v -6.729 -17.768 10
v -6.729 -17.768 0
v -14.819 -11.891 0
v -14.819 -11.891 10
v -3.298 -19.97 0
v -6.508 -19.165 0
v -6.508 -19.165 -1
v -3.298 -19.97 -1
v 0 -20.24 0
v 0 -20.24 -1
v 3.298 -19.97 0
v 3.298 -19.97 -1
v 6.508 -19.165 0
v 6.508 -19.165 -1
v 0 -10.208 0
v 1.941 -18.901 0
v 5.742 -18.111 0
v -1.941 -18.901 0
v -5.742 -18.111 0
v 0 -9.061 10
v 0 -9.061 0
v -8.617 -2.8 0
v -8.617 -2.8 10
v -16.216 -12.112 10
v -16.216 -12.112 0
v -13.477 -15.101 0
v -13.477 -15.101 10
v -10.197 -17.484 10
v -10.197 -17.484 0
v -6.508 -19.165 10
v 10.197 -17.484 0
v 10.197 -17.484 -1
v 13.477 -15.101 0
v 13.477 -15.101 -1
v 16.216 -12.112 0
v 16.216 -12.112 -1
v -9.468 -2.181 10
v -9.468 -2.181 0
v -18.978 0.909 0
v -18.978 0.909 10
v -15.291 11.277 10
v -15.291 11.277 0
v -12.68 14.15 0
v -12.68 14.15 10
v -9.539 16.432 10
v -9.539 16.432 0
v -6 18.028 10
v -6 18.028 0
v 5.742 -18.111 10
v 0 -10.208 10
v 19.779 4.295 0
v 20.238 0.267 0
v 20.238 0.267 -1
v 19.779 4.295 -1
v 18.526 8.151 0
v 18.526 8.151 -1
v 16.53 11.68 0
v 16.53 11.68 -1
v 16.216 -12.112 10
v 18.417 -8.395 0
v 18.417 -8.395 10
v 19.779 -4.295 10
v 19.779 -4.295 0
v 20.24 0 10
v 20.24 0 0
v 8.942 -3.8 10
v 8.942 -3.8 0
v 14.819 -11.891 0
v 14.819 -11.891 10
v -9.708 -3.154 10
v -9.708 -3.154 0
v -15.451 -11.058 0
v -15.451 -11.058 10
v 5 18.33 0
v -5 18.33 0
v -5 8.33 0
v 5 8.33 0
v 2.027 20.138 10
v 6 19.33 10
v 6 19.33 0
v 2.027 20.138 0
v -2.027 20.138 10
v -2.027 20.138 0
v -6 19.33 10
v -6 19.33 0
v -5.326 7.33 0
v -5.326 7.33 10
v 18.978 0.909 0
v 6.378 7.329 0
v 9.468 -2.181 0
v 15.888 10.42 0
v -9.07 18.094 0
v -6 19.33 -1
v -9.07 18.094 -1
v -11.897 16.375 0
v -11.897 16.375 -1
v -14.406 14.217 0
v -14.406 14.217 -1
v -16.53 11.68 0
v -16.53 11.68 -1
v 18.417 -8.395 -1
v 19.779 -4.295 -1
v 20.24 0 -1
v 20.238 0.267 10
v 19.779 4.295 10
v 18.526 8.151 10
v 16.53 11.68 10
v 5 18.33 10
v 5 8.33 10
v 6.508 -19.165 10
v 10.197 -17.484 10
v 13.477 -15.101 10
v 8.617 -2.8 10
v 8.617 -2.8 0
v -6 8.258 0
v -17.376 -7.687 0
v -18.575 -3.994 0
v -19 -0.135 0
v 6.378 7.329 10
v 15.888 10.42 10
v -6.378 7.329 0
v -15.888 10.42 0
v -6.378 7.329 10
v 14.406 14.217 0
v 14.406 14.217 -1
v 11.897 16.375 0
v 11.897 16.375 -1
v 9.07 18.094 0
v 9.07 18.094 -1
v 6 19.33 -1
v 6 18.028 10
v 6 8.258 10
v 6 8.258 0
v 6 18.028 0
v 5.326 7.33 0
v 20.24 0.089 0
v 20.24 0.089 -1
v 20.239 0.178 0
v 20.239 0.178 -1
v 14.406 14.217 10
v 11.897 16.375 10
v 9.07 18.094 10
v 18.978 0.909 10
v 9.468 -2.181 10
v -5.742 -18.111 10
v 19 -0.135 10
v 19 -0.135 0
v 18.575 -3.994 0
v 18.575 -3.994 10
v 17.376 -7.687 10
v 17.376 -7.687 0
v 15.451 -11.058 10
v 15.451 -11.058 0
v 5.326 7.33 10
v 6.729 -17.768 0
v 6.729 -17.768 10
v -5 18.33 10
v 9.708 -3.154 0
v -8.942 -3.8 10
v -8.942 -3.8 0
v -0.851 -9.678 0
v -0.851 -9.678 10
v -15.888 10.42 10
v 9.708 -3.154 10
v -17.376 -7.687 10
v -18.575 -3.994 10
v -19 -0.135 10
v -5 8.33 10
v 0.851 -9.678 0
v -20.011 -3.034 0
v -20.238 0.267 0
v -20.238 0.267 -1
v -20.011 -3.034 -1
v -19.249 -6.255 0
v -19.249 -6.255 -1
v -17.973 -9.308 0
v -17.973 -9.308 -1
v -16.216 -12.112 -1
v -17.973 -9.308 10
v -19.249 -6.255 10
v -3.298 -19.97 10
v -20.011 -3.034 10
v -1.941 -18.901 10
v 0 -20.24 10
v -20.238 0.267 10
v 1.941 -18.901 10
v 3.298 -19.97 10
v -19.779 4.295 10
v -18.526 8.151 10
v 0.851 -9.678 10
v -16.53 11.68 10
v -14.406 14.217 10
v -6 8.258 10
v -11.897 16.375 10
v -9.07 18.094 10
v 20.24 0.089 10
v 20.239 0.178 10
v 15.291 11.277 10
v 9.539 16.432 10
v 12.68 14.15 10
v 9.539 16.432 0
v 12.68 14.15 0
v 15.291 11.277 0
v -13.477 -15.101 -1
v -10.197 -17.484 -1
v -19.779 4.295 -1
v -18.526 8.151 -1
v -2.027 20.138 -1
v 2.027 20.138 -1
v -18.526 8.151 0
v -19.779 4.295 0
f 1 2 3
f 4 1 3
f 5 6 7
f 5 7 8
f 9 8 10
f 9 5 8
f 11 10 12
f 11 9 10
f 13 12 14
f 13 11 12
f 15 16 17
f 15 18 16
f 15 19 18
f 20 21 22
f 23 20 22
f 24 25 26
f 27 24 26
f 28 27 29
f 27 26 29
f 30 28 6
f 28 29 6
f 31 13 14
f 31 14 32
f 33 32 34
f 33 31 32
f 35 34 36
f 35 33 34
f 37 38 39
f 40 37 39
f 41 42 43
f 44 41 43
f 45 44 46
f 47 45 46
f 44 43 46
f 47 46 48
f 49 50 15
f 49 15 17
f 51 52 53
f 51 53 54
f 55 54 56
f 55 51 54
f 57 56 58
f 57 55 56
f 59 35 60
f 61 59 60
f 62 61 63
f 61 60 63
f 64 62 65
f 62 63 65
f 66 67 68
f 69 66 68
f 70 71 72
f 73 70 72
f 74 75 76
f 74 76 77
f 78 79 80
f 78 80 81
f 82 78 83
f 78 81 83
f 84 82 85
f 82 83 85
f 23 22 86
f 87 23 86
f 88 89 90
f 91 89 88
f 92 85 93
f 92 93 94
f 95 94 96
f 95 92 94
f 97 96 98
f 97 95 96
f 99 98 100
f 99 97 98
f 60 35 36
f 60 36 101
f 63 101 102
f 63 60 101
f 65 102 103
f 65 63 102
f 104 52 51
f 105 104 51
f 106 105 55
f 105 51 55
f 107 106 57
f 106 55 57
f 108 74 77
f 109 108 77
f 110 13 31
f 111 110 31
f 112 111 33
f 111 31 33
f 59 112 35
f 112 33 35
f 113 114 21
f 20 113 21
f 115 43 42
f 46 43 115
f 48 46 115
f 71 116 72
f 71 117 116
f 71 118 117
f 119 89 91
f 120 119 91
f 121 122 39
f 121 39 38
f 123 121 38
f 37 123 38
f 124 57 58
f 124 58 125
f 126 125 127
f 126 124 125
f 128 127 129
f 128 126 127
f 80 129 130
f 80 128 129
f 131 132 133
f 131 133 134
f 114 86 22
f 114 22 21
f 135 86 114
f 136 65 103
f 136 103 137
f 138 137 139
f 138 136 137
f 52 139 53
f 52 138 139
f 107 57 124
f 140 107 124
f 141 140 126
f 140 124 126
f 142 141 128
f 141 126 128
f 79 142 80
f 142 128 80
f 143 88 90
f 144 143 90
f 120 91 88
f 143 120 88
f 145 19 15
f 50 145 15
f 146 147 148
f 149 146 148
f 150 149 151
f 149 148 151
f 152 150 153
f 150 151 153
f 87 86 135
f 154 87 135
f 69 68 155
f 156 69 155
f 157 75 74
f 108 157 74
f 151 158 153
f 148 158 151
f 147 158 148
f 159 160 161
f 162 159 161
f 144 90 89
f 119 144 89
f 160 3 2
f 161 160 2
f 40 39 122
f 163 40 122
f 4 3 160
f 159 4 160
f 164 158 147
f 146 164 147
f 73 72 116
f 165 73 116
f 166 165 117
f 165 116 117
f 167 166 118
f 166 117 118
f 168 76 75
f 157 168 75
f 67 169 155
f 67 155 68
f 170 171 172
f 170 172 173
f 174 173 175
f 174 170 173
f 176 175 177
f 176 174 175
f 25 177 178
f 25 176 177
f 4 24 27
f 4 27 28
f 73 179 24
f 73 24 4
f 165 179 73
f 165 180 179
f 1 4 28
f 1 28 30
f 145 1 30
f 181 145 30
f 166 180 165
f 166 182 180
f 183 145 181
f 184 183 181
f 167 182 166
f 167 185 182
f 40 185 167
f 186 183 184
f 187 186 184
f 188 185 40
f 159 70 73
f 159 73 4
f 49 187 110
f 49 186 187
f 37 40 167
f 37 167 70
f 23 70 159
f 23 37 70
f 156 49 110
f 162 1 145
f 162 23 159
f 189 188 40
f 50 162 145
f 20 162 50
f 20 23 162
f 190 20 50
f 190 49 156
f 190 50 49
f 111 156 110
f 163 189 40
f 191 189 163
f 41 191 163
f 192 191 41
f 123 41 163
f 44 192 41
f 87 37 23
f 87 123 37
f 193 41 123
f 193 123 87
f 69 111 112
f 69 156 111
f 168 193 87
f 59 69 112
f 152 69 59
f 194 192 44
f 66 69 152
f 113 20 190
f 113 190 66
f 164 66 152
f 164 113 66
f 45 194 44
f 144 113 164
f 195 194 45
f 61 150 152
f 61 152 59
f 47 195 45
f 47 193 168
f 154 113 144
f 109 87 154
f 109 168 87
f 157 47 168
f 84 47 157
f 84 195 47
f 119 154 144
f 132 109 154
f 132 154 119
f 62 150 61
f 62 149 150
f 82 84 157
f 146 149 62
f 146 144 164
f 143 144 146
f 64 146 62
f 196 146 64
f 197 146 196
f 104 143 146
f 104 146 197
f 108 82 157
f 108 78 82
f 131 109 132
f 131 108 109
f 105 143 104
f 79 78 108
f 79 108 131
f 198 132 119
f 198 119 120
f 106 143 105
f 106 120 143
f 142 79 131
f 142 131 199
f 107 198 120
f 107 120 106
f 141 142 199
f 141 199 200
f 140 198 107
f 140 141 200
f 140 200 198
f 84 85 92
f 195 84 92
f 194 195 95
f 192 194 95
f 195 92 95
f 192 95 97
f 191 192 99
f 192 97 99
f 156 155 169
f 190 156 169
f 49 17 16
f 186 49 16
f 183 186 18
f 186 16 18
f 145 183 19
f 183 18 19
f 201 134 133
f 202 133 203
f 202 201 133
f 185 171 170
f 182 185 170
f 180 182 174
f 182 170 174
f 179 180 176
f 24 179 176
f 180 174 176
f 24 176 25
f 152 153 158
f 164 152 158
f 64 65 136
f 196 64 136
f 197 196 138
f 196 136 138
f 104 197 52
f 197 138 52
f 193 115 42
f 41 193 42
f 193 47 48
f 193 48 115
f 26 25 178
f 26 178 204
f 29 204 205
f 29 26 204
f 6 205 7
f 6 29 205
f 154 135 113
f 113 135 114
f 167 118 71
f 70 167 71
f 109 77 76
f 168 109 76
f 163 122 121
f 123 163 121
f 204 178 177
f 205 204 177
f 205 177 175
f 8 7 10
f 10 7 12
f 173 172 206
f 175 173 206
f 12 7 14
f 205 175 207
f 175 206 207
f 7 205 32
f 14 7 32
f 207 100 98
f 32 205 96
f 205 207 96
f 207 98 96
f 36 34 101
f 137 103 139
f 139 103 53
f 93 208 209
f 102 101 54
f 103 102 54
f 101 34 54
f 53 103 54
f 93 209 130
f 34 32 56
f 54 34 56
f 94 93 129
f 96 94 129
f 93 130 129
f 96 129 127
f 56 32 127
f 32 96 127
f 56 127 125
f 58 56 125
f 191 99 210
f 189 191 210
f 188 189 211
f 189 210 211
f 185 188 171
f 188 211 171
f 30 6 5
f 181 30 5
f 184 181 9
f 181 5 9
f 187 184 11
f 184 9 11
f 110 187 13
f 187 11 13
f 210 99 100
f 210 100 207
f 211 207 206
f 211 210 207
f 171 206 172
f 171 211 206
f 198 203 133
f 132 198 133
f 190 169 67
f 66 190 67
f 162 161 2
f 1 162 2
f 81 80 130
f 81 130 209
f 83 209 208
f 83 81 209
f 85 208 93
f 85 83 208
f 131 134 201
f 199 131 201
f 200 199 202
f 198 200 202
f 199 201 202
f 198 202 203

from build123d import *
from build123d import SkipClean  # not in build123d's __all__

# Parameters (mm, degrees)
F0_W     = 10
F0_H     = 10
F1_DEPTH = 1
F2_DEPTH = 10


with BuildPart() as f1:
    # F0 (on Top) → F1 (new body)
    with BuildSketch(Plane.XY):
        with BuildLine():
            Line((6, 8.2582915228), (6, 18.0277563773))
            ThreePointArc((6, 18.0277563773), (5.5020799323, 18.1859043333), (5, 18.3303027798))
            Line((5, 18.3303027798), (5, 8.3303027798))
            Line((5, 8.3303027798), (-5, 8.3303027798))
            Line((-5, 8.3303027798), (-5, 18.3303027798))
            ThreePointArc((-5, 18.3303027798), (-5.5020799323, 18.1859043333), (-6, 18.0277563773))
            Line((-6, 18.0277563773), (-6, 8.2582915228))
            Line((-6, 8.2582915228), (-5.1174302589, 7.9715272307))
            Line((-5.1174302589, 7.9715272307), (-5.3257767127, 7.3303027798))
            Line((-5.3257767127, 7.3303027798), (5.3257767127, 7.3303027798))
            Line((5.3257767127, 7.3303027798), (5.1174302589, 7.9715272307))
            Line((5.1174302589, 7.9715272307), (6, 8.2582915228))
        make_face()
        with BuildLine():
            ThreePointArc((-6.5079649301, -19.165254969), (0, -20.2400742479), (6.5079649301, -19.165254969))
            Line((6.5079649301, -19.165254969), (5.7423473643, -18.1114727935))
            ThreePointArc((5.7423473643, -18.1114727935), (0, -19), (-5.7423473643, -18.1114727935))
            Line((-5.7423473643, -18.1114727935), (-6.5079649301, -19.165254969))
        make_face()
        with BuildLine():
            ThreePointArc((-6.7291966722, -17.7684527224), (-6.2381301971, -17.9467471048), (-5.7423473643, -18.1114727935))
            Line((-5.7423473643, -18.1114727935), (0, -10.2078097002))
            Line((0, -10.2078097002), (-0.5454580974, -9.4570510365))
            Line((-0.5454580974, -9.4570510365), (0, -9.0607525315))
            Line((0, -9.0607525315), (-8.6172877376, -2.7999265141))
            Line((-8.6172877376, -2.7999265141), (-8.8256341914, -3.4411509649))
            Line((-8.8256341914, -3.4411509649), (-9.7082039325, -3.1543866727))
            Line((-9.7082039325, -3.1543866727), (-15.4505512968, -11.0580497659))
            ThreePointArc((-15.4505512968, -11.0580497659), (-15.1406825363, -11.4786642225), (-14.8193666159, -11.8906001995))
            Line((-14.8193666159, -11.8906001995), (-8.941514093, -3.8004302557))
            Line((-8.941514093, -3.8004302557), (-0.8513441492, -9.6782827786))
            Line((-0.8513441492, -9.6782827786), (-6.7291966722, -17.7684527224))
        make_face()
        Polygon((18.9782388763, 0.9090924895), (15.8880689325, 10.4196576525), (6.3775037696, 7.3294877087), (9.4676737133, -2.1810774542), align=None)
        Polygon((0, -9.0607525315), (8.6172877376, -2.7999265141), (5.3257767127, 7.3303027798), (-5.3257767127, 7.3303027798), (-8.6172877376, -2.7999265141), align=None)
        with BuildLine():
            Line((6, 8.2582915228), (15.2913132106, 11.2772221888))
            ThreePointArc((15.2913132106, 11.2772221888), (11.1679197936, 15.3713228931), (6, 18.0277563773))
            Line((6, 18.0277563773), (6, 8.2582915228))
        make_face()
        Polygon((-6.3775037696, 7.3294877087), (-15.8880689325, 10.4196576525), (-18.9782388763, 0.9090924895), (-9.4676737133, -2.1810774542), align=None)
        with BuildLine():
            ThreePointArc((16.2161688626, -12.1118319415), (19.2077727412, -6.3813847935), (20.2400742479, 0))
            ThreePointArc((20.2400742479, 0), (20.2396337779, 0.1335293897), (20.238312387, 0.2670529676))
            Line((20.238312387, 0.2670529676), (18.9995171431, -0.1354560067))
            ThreePointArc((18.9995171431, -0.1354560067), (18.0700738096, -5.8713228931), (15.4505512968, -11.0580497659))
            Line((15.4505512968, -11.0580497659), (16.2161688626, -12.1118319415))
        make_face()
        with BuildLine():
            ThreePointArc((14.8193666159, -11.8906001995), (15.1406825363, -11.4786642225), (15.4505512968, -11.0580497659))
            Line((15.4505512968, -11.0580497659), (9.7082039325, -3.1543866727))
            Line((9.7082039325, -3.1543866727), (8.8256341914, -3.4411509649))
            Line((8.8256341914, -3.4411509649), (8.6172877376, -2.7999265141))
            Line((8.6172877376, -2.7999265141), (0, -9.0607525315))
            Line((0, -9.0607525315), (0.5454580974, -9.4570510365))
            Line((0.5454580974, -9.4570510365), (0, -10.2078097002))
            Line((0, -10.2078097002), (5.7423473643, -18.1114727935))
            ThreePointArc((5.7423473643, -18.1114727935), (6.2381301971, -17.9467471048), (6.7291966722, -17.7684527224))
            Line((6.7291966722, -17.7684527224), (0.8513441492, -9.6782827786))
            Line((0.8513441492, -9.6782827786), (8.941514093, -3.8004302557))
            Line((8.941514093, -3.8004302557), (14.8193666159, -11.8906001995))
        make_face()
        with BuildLine():
            Line((-6, 18.0277563773), (-6, 19.3303027798))
            ThreePointArc((-6, 19.3303027798), (-11.8968171482, 16.3745640339), (-16.5301084545, 11.6797311631))
            Line((-16.5301084545, 11.6797311631), (-15.2913132106, 11.2772221888))
            ThreePointArc((-15.2913132106, 11.2772221888), (-11.1679197936, 15.3713228931), (-6, 18.0277563773))
        make_face()
        with BuildLine():
            ThreePointArc((-18.9995171431, -0.1354560067), (-18.0700738096, -5.8713228931), (-15.4505512968, -11.0580497659))
            Line((-15.4505512968, -11.0580497659), (-9.7082039325, -3.1543866727))
            Line((-9.7082039325, -3.1543866727), (-18.9995171431, -0.1354560067))
        make_face()
        with Locations((0, 13.3303027798)):
            Rectangle(F0_W, F0_H)
        with BuildLine():
            ThreePointArc((6.5079649301, -19.165254969), (11.8968171482, -16.3745640339), (16.2161688626, -12.1118319415))
            Line((16.2161688626, -12.1118319415), (6.5079649301, -19.165254969))
        make_face()
        with BuildLine():
            ThreePointArc((-16.2161688626, -12.1118319415), (-11.8968171482, -16.3745640339), (-6.5079649301, -19.165254969))
            Line((-6.5079649301, -19.165254969), (-16.2161688626, -12.1118319415))
        make_face()
        with BuildLine():
            Line((-20.238312387, 0.2670529676), (-16.5301084545, 11.6797311631))
            ThreePointArc((-16.5301084545, 11.6797311631), (-19.2494545037, 6.25452691), (-20.238312387, 0.2670529676))
        make_face()
        with BuildLine():
            Line((-6, 19.3303027798), (6, 19.3303027798))
            ThreePointArc((6, 19.3303027798), (0, 20.2400742479), (-6, 19.3303027798))
        make_face()
        with BuildLine():
            Line((16.5301084545, 11.6797311631), (20.238312387, 0.2670529676))
            ThreePointArc((20.238312387, 0.2670529676), (19.2494545037, 6.25452691), (16.5301084545, 11.6797311631))
        make_face()
        with BuildLine():
            Line((-15.2913132106, 11.2772221888), (-16.5301084545, 11.6797311631))
            Line((-16.5301084545, 11.6797311631), (-20.238312387, 0.2670529676))
            Line((-20.238312387, 0.2670529676), (-18.9995171431, -0.1354560067))
            ThreePointArc((-18.9995171431, -0.1354560067), (-18.9960590244, 0.3869645243), (-18.9782388763, 0.9090924895))
            ThreePointArc((-18.9782388763, 0.9090924895), (-18.0700738096, 5.8713228931), (-15.8880689325, 10.4196576525))
            ThreePointArc((-15.8880689325, 10.4196576525), (-15.5955866174, 10.8525424698), (-15.2913132106, 11.2772221888))
        make_face()
        Polygon((-14.8193666159, -11.8906001995), (-6.7291966722, -17.7684527224), (-0.8513441492, -9.6782827786), (-8.941514093, -3.8004302557), align=None)
        with BuildLine():
            Line((9.7082039325, -3.1543866727), (18.9995171431, -0.1354560067))
            ThreePointArc((18.9995171431, -0.1354560067), (18.9998792854, -0.0677284337), (19, 0))
            ThreePointArc((19, 0), (18.99455894, 0.4546764512), (18.9782388763, 0.9090924895))
            Line((18.9782388763, 0.9090924895), (9.4676737133, -2.1810774542))
            Line((9.4676737133, -2.1810774542), (6.3775037696, 7.3294877087))
            Line((6.3775037696, 7.3294877087), (15.8880689325, 10.4196576525))
            ThreePointArc((15.8880689325, 10.4196576525), (15.5955866174, 10.8525424698), (15.2913132106, 11.2772221888))
            Line((15.2913132106, 11.2772221888), (6, 8.2582915228))
            Line((6, 8.2582915228), (6, 7.3303027798))
            Line((6, 7.3303027798), (5.3257767127, 7.3303027798))
            Line((5.3257767127, 7.3303027798), (8.6172877376, -2.7999265141))
            Line((8.6172877376, -2.7999265141), (9.1627458351, -2.403628009))
            Line((9.1627458351, -2.403628009), (9.7082039325, -3.1543866727))
        make_face()
        with BuildLine():
            ThreePointArc((15.4505512968, -11.0580497659), (18.0700738096, -5.8713228931), (18.9995171431, -0.1354560067))
            Line((18.9995171431, -0.1354560067), (9.7082039325, -3.1543866727))
            Line((9.7082039325, -3.1543866727), (15.4505512968, -11.0580497659))
        make_face()
        with BuildLine():
            ThreePointArc((-20.238312387, 0.2670529676), (-19.2494545037, -6.25452691), (-16.2161688626, -12.1118319415))
            Line((-16.2161688626, -12.1118319415), (-15.4505512968, -11.0580497659))
            ThreePointArc((-15.4505512968, -11.0580497659), (-18.0700738096, -5.8713228931), (-18.9995171431, -0.1354560067))
            Line((-18.9995171431, -0.1354560067), (-20.238312387, 0.2670529676))
        make_face()
        with BuildLine():
            Line((-6, 8.2582915228), (-15.2913132106, 11.2772221888))
            ThreePointArc((-15.2913132106, 11.2772221888), (-15.5955866174, 10.8525424698), (-15.8880689325, 10.4196576525))
            Line((-15.8880689325, 10.4196576525), (-6.3775037696, 7.3294877087))
            Line((-6.3775037696, 7.3294877087), (-9.4676737133, -2.1810774542))
            Line((-9.4676737133, -2.1810774542), (-18.9782388763, 0.9090924895))
            ThreePointArc((-18.9782388763, 0.9090924895), (-18.9960590244, 0.3869645243), (-18.9995171431, -0.1354560067))
            Line((-18.9995171431, -0.1354560067), (-9.7082039325, -3.1543866727))
            Line((-9.7082039325, -3.1543866727), (-9.1627458351, -2.403628009))
            Line((-9.1627458351, -2.403628009), (-8.6172877376, -2.7999265141))
            Line((-8.6172877376, -2.7999265141), (-5.3257767127, 7.3303027798))
            Line((-5.3257767127, 7.3303027798), (-6, 7.3303027798))
            Line((-6, 7.3303027798), (-6, 8.2582915228))
        make_face()
        with BuildLine():
            Line((15.2913132106, 11.2772221888), (16.5301084545, 11.6797311631))
            ThreePointArc((16.5301084545, 11.6797311631), (11.8968171482, 16.3745640339), (6, 19.3303027798))
            Line((6, 19.3303027798), (6, 18.0277563773))
            ThreePointArc((6, 18.0277563773), (11.1679197936, 15.3713228931), (15.2913132106, 11.2772221888))
        make_face()
        Polygon((6.7291966722, -17.7684527224), (14.8193666159, -11.8906001995), (8.941514093, -3.8004302557), (0.8513441492, -9.6782827786), align=None)
        with BuildLine():
            ThreePointArc((-5.7423473643, -18.1114727935), (0, -19), (5.7423473643, -18.1114727935))
            Line((5.7423473643, -18.1114727935), (0, -10.2078097002))
            Line((0, -10.2078097002), (-5.7423473643, -18.1114727935))
        make_face()
        with BuildLine():
            Line((-6, 8.2582915228), (-6, 18.0277563773))
            ThreePointArc((-6, 18.0277563773), (-11.1679197936, 15.3713228931), (-15.2913132106, 11.2772221888))
            Line((-15.2913132106, 11.2772221888), (-6, 8.2582915228))
        make_face()
        with BuildLine():
            Line((18.9995171431, -0.1354560067), (20.238312387, 0.2670529676))
            Line((20.238312387, 0.2670529676), (16.5301084545, 11.6797311631))
            Line((16.5301084545, 11.6797311631), (15.2913132106, 11.2772221888))
            ThreePointArc((15.2913132106, 11.2772221888), (15.5955866174, 10.8525424698), (15.8880689325, 10.4196576525))
            ThreePointArc((15.8880689325, 10.4196576525), (18.0700738096, 5.8713228931), (18.9782388763, 0.9090924895))
            ThreePointArc((18.9782388763, 0.9090924895), (18.99455894, 0.4546764512), (19, 0))
            ThreePointArc((19, 0), (18.9998792854, -0.0677284337), (18.9995171431, -0.1354560067))
        make_face()
        with BuildLine():
            Line((6, 18.0277563773), (6, 19.3303027798))
            Line((6, 19.3303027798), (-6, 19.3303027798))
            Line((-6, 19.3303027798), (-6, 18.0277563773))
            ThreePointArc((-6, 18.0277563773), (-5.5020799323, 18.1859043333), (-5, 18.3303027798))
            ThreePointArc((-5, 18.3303027798), (0, 19), (5, 18.3303027798))
            ThreePointArc((5, 18.3303027798), (5.5020799323, 18.1859043333), (6, 18.0277563773))
        make_face()
        with BuildLine():
            Line((6.5079649301, -19.165254969), (16.2161688626, -12.1118319415))
            Line((16.2161688626, -12.1118319415), (15.4505512968, -11.0580497659))
            ThreePointArc((15.4505512968, -11.0580497659), (15.1406825363, -11.4786642225), (14.8193666159, -11.8906001995))
            ThreePointArc((14.8193666159, -11.8906001995), (11.1679197936, -15.3713228931), (6.7291966722, -17.7684527224))
            ThreePointArc((6.7291966722, -17.7684527224), (6.2381301971, -17.9467471048), (5.7423473643, -18.1114727935))
            Line((5.7423473643, -18.1114727935), (6.5079649301, -19.165254969))
        make_face()
        with BuildLine():
            Line((-16.2161688626, -12.1118319415), (-6.5079649301, -19.165254969))
            Line((-6.5079649301, -19.165254969), (-5.7423473643, -18.1114727935))
            ThreePointArc((-5.7423473643, -18.1114727935), (-6.2381301971, -17.9467471048), (-6.7291966722, -17.7684527224))
            ThreePointArc((-6.7291966722, -17.7684527224), (-11.1679197936, -15.3713228931), (-14.8193666159, -11.8906001995))
            ThreePointArc((-14.8193666159, -11.8906001995), (-15.1406825363, -11.4786642225), (-15.4505512968, -11.0580497659))
            Line((-15.4505512968, -11.0580497659), (-16.2161688626, -12.1118319415))
        make_face()
        with BuildLine():
            ThreePointArc((6.7291966722, -17.7684527224), (11.1679197936, -15.3713228931), (14.8193666159, -11.8906001995))
            Line((14.8193666159, -11.8906001995), (6.7291966722, -17.7684527224))
        make_face()
        with BuildLine():
            ThreePointArc((-14.8193666159, -11.8906001995), (-11.1679197936, -15.3713228931), (-6.7291966722, -17.7684527224))
            Line((-6.7291966722, -17.7684527224), (-14.8193666159, -11.8906001995))
        make_face()
        with BuildLine():
            Line((-18.9782388763, 0.9090924895), (-15.8880689325, 10.4196576525))
            ThreePointArc((-15.8880689325, 10.4196576525), (-18.0700738096, 5.8713228931), (-18.9782388763, 0.9090924895))
        make_face()
        with BuildLine():
            Line((-5, 18.3303027798), (5, 18.3303027798))
            ThreePointArc((5, 18.3303027798), (0, 19), (-5, 18.3303027798))
        make_face()
        with BuildLine():
            ThreePointArc((18.9782388763, 0.9090924895), (18.0700738096, 5.8713228931), (15.8880689325, 10.4196576525))
            Line((15.8880689325, 10.4196576525), (18.9782388763, 0.9090924895))
        make_face()
        Polygon((8.8256341914, -3.4411509649), (9.7082039325, -3.1543866727), (9.1627458351, -2.403628009), (8.6172877376, -2.7999265141), align=None)
        Polygon((6, 7.3303027798), (6, 8.2582915228), (5.1174302589, 7.9715272307), (5.3257767127, 7.3303027798), align=None)
        Polygon((-5.1174302589, 7.9715272307), (-6, 8.2582915228), (-6, 7.3303027798), (-5.3257767127, 7.3303027798), align=None)
        Polygon((-9.1627458351, -2.403628009), (-9.7082039325, -3.1543866727), (-8.8256341914, -3.4411509649), (-8.6172877376, -2.7999265141), align=None)
        Polygon((-0.5454580974, -9.4570510365), (0, -10.2078097002), (0.5454580974, -9.4570510365), (0, -9.0607525315), align=None)
    extrude(amount=-F1_DEPTH)

    # F0 (on Top) → F2 (join)
    with BuildSketch(Plane.XY):
        with BuildLine():
            Line((-6, 18.0277563773), (-6, 19.3303027798))
            ThreePointArc((-6, 19.3303027798), (-11.8968171482, 16.3745640339), (-16.5301084545, 11.6797311631))
            Line((-16.5301084545, 11.6797311631), (-15.2913132106, 11.2772221888))
            ThreePointArc((-15.2913132106, 11.2772221888), (-11.1679197936, 15.3713228931), (-6, 18.0277563773))
        make_face()
        with BuildLine():
            Line((6, 8.2582915228), (6, 18.0277563773))
            ThreePointArc((6, 18.0277563773), (5.5020799323, 18.1859043333), (5, 18.3303027798))
            Line((5, 18.3303027798), (5, 8.3303027798))
            Line((5, 8.3303027798), (-5, 8.3303027798))
            Line((-5, 8.3303027798), (-5, 18.3303027798))
            ThreePointArc((-5, 18.3303027798), (-5.5020799323, 18.1859043333), (-6, 18.0277563773))
            Line((-6, 18.0277563773), (-6, 8.2582915228))
            Line((-6, 8.2582915228), (-5.1174302589, 7.9715272307))
            Line((-5.1174302589, 7.9715272307), (-5.3257767127, 7.3303027798))
            Line((-5.3257767127, 7.3303027798), (5.3257767127, 7.3303027798))
            Line((5.3257767127, 7.3303027798), (5.1174302589, 7.9715272307))
            Line((5.1174302589, 7.9715272307), (6, 8.2582915228))
        make_face()
        with BuildLine():
            Line((-18.9782388763, 0.9090924895), (-15.8880689325, 10.4196576525))
            ThreePointArc((-15.8880689325, 10.4196576525), (-18.0700738096, 5.8713228931), (-18.9782388763, 0.9090924895))
        make_face()
        with BuildLine():
            Line((-5, 18.3303027798), (5, 18.3303027798))
            ThreePointArc((5, 18.3303027798), (0, 19), (-5, 18.3303027798))
        make_face()
        with BuildLine():
            ThreePointArc((18.9782388763, 0.9090924895), (18.0700738096, 5.8713228931), (15.8880689325, 10.4196576525))
            Line((15.8880689325, 10.4196576525), (18.9782388763, 0.9090924895))
        make_face()
        with BuildLine():
            Line((-20.238312387, 0.2670529676), (-16.5301084545, 11.6797311631))
            ThreePointArc((-16.5301084545, 11.6797311631), (-19.2494545037, 6.25452691), (-20.238312387, 0.2670529676))
        make_face()
        with BuildLine():
            Line((-6, 19.3303027798), (6, 19.3303027798))
            ThreePointArc((6, 19.3303027798), (0, 20.2400742479), (-6, 19.3303027798))
        make_face()
        with BuildLine():
            Line((16.5301084545, 11.6797311631), (20.238312387, 0.2670529676))
            ThreePointArc((20.238312387, 0.2670529676), (19.2494545037, 6.25452691), (16.5301084545, 11.6797311631))
        make_face()
        with BuildLine():
            Line((-15.2913132106, 11.2772221888), (-16.5301084545, 11.6797311631))
            Line((-16.5301084545, 11.6797311631), (-20.238312387, 0.2670529676))
            Line((-20.238312387, 0.2670529676), (-18.9995171431, -0.1354560067))
            ThreePointArc((-18.9995171431, -0.1354560067), (-18.9960590244, 0.3869645243), (-18.9782388763, 0.9090924895))
            ThreePointArc((-18.9782388763, 0.9090924895), (-18.0700738096, 5.8713228931), (-15.8880689325, 10.4196576525))
            ThreePointArc((-15.8880689325, 10.4196576525), (-15.5955866174, 10.8525424698), (-15.2913132106, 11.2772221888))
        make_face()
        with BuildLine():
            Line((9.7082039325, -3.1543866727), (18.9995171431, -0.1354560067))
            ThreePointArc((18.9995171431, -0.1354560067), (18.9998792854, -0.0677284337), (19, 0))
            ThreePointArc((19, 0), (18.99455894, 0.4546764512), (18.9782388763, 0.9090924895))
            Line((18.9782388763, 0.9090924895), (9.4676737133, -2.1810774542))
            Line((9.4676737133, -2.1810774542), (6.3775037696, 7.3294877087))
            Line((6.3775037696, 7.3294877087), (15.8880689325, 10.4196576525))
            ThreePointArc((15.8880689325, 10.4196576525), (15.5955866174, 10.8525424698), (15.2913132106, 11.2772221888))
            Line((15.2913132106, 11.2772221888), (6, 8.2582915228))
            Line((6, 8.2582915228), (6, 7.3303027798))
            Line((6, 7.3303027798), (5.3257767127, 7.3303027798))
            Line((5.3257767127, 7.3303027798), (8.6172877376, -2.7999265141))
            Line((8.6172877376, -2.7999265141), (9.1627458351, -2.403628009))
            Line((9.1627458351, -2.403628009), (9.7082039325, -3.1543866727))
        make_face()
        with BuildLine():
            Line((15.2913132106, 11.2772221888), (16.5301084545, 11.6797311631))
            ThreePointArc((16.5301084545, 11.6797311631), (11.8968171482, 16.3745640339), (6, 19.3303027798))
            Line((6, 19.3303027798), (6, 18.0277563773))
            ThreePointArc((6, 18.0277563773), (11.1679197936, 15.3713228931), (15.2913132106, 11.2772221888))
        make_face()
        with BuildLine():
            ThreePointArc((-20.238312387, 0.2670529676), (-19.2494545037, -6.25452691), (-16.2161688626, -12.1118319415))
            Line((-16.2161688626, -12.1118319415), (-15.4505512968, -11.0580497659))
            ThreePointArc((-15.4505512968, -11.0580497659), (-18.0700738096, -5.8713228931), (-18.9995171431, -0.1354560067))
            Line((-18.9995171431, -0.1354560067), (-20.238312387, 0.2670529676))
        make_face()
        with BuildLine():
            ThreePointArc((16.2161688626, -12.1118319415), (19.2077727412, -6.3813847935), (20.2400742479, 0))
            ThreePointArc((20.2400742479, 0), (20.2396337779, 0.1335293897), (20.238312387, 0.2670529676))
            Line((20.238312387, 0.2670529676), (18.9995171431, -0.1354560067))
            ThreePointArc((18.9995171431, -0.1354560067), (18.0700738096, -5.8713228931), (15.4505512968, -11.0580497659))
            Line((15.4505512968, -11.0580497659), (16.2161688626, -12.1118319415))
        make_face()
        with BuildLine():
            Line((-6, 8.2582915228), (-15.2913132106, 11.2772221888))
            ThreePointArc((-15.2913132106, 11.2772221888), (-15.5955866174, 10.8525424698), (-15.8880689325, 10.4196576525))
            Line((-15.8880689325, 10.4196576525), (-6.3775037696, 7.3294877087))
            Line((-6.3775037696, 7.3294877087), (-9.4676737133, -2.1810774542))
            Line((-9.4676737133, -2.1810774542), (-18.9782388763, 0.9090924895))
            ThreePointArc((-18.9782388763, 0.9090924895), (-18.9960590244, 0.3869645243), (-18.9995171431, -0.1354560067))
            Line((-18.9995171431, -0.1354560067), (-9.7082039325, -3.1543866727))
            Line((-9.7082039325, -3.1543866727), (-9.1627458351, -2.403628009))
            Line((-9.1627458351, -2.403628009), (-8.6172877376, -2.7999265141))
            Line((-8.6172877376, -2.7999265141), (-5.3257767127, 7.3303027798))
            Line((-5.3257767127, 7.3303027798), (-6, 7.3303027798))
            Line((-6, 7.3303027798), (-6, 8.2582915228))
        make_face()
        with BuildLine():
            Line((6, 18.0277563773), (6, 19.3303027798))
            Line((6, 19.3303027798), (-6, 19.3303027798))
            Line((-6, 19.3303027798), (-6, 18.0277563773))
            ThreePointArc((-6, 18.0277563773), (-5.5020799323, 18.1859043333), (-5, 18.3303027798))
            ThreePointArc((-5, 18.3303027798), (0, 19), (5, 18.3303027798))
            ThreePointArc((5, 18.3303027798), (5.5020799323, 18.1859043333), (6, 18.0277563773))
        make_face()
        with BuildLine():
            Line((18.9995171431, -0.1354560067), (20.238312387, 0.2670529676))
            Line((20.238312387, 0.2670529676), (16.5301084545, 11.6797311631))
            Line((16.5301084545, 11.6797311631), (15.2913132106, 11.2772221888))
            ThreePointArc((15.2913132106, 11.2772221888), (15.5955866174, 10.8525424698), (15.8880689325, 10.4196576525))
            ThreePointArc((15.8880689325, 10.4196576525), (18.0700738096, 5.8713228931), (18.9782388763, 0.9090924895))
            ThreePointArc((18.9782388763, 0.9090924895), (18.99455894, 0.4546764512), (19, 0))
            ThreePointArc((19, 0), (18.9998792854, -0.0677284337), (18.9995171431, -0.1354560067))
        make_face()
        Polygon((8.8256341914, -3.4411509649), (9.7082039325, -3.1543866727), (9.1627458351, -2.403628009), (8.6172877376, -2.7999265141), align=None)
        Polygon((6, 7.3303027798), (6, 8.2582915228), (5.1174302589, 7.9715272307), (5.3257767127, 7.3303027798), align=None)
        Polygon((-5.1174302589, 7.9715272307), (-6, 8.2582915228), (-6, 7.3303027798), (-5.3257767127, 7.3303027798), align=None)
        Polygon((-9.1627458351, -2.403628009), (-9.7082039325, -3.1543866727), (-8.8256341914, -3.4411509649), (-8.6172877376, -2.7999265141), align=None)
        Polygon((-0.5454580974, -9.4570510365), (0, -10.2078097002), (0.5454580974, -9.4570510365), (0, -9.0607525315), align=None)
        with BuildLine():
            Line((-16.2161688626, -12.1118319415), (-6.5079649301, -19.165254969))
            Line((-6.5079649301, -19.165254969), (-5.7423473643, -18.1114727935))
            ThreePointArc((-5.7423473643, -18.1114727935), (-6.2381301971, -17.9467471048), (-6.7291966722, -17.7684527224))
            ThreePointArc((-6.7291966722, -17.7684527224), (-11.1679197936, -15.3713228931), (-14.8193666159, -11.8906001995))
            ThreePointArc((-14.8193666159, -11.8906001995), (-15.1406825363, -11.4786642225), (-15.4505512968, -11.0580497659))
            Line((-15.4505512968, -11.0580497659), (-16.2161688626, -12.1118319415))
        make_face()
        with BuildLine():
            ThreePointArc((-6.7291966722, -17.7684527224), (-6.2381301971, -17.9467471048), (-5.7423473643, -18.1114727935))
            Line((-5.7423473643, -18.1114727935), (0, -10.2078097002))
            Line((0, -10.2078097002), (-0.5454580974, -9.4570510365))
            Line((-0.5454580974, -9.4570510365), (0, -9.0607525315))
            Line((0, -9.0607525315), (-8.6172877376, -2.7999265141))
            Line((-8.6172877376, -2.7999265141), (-8.8256341914, -3.4411509649))
            Line((-8.8256341914, -3.4411509649), (-9.7082039325, -3.1543866727))
            Line((-9.7082039325, -3.1543866727), (-15.4505512968, -11.0580497659))
            ThreePointArc((-15.4505512968, -11.0580497659), (-15.1406825363, -11.4786642225), (-14.8193666159, -11.8906001995))
            Line((-14.8193666159, -11.8906001995), (-8.941514093, -3.8004302557))
            Line((-8.941514093, -3.8004302557), (-0.8513441492, -9.6782827786))
            Line((-0.8513441492, -9.6782827786), (-6.7291966722, -17.7684527224))
        make_face()
        with BuildLine():
            ThreePointArc((-6.5079649301, -19.165254969), (0, -20.2400742479), (6.5079649301, -19.165254969))
            Line((6.5079649301, -19.165254969), (5.7423473643, -18.1114727935))
            ThreePointArc((5.7423473643, -18.1114727935), (0, -19), (-5.7423473643, -18.1114727935))
            Line((-5.7423473643, -18.1114727935), (-6.5079649301, -19.165254969))
        make_face()
        with BuildLine():
            ThreePointArc((6.5079649301, -19.165254969), (11.8968171482, -16.3745640339), (16.2161688626, -12.1118319415))
            Line((16.2161688626, -12.1118319415), (6.5079649301, -19.165254969))
        make_face()
        with BuildLine():
            ThreePointArc((-16.2161688626, -12.1118319415), (-11.8968171482, -16.3745640339), (-6.5079649301, -19.165254969))
            Line((-6.5079649301, -19.165254969), (-16.2161688626, -12.1118319415))
        make_face()
        with BuildLine():
            ThreePointArc((14.8193666159, -11.8906001995), (15.1406825363, -11.4786642225), (15.4505512968, -11.0580497659))
            Line((15.4505512968, -11.0580497659), (9.7082039325, -3.1543866727))
            Line((9.7082039325, -3.1543866727), (8.8256341914, -3.4411509649))
            Line((8.8256341914, -3.4411509649), (8.6172877376, -2.7999265141))
            Line((8.6172877376, -2.7999265141), (0, -9.0607525315))
            Line((0, -9.0607525315), (0.5454580974, -9.4570510365))
            Line((0.5454580974, -9.4570510365), (0, -10.2078097002))
            Line((0, -10.2078097002), (5.7423473643, -18.1114727935))
            ThreePointArc((5.7423473643, -18.1114727935), (6.2381301971, -17.9467471048), (6.7291966722, -17.7684527224))
            Line((6.7291966722, -17.7684527224), (0.8513441492, -9.6782827786))
            Line((0.8513441492, -9.6782827786), (8.941514093, -3.8004302557))
            Line((8.941514093, -3.8004302557), (14.8193666159, -11.8906001995))
        make_face()
        with BuildLine():
            ThreePointArc((6.7291966722, -17.7684527224), (11.1679197936, -15.3713228931), (14.8193666159, -11.8906001995))
            Line((14.8193666159, -11.8906001995), (6.7291966722, -17.7684527224))
        make_face()
        with BuildLine():
            ThreePointArc((-14.8193666159, -11.8906001995), (-11.1679197936, -15.3713228931), (-6.7291966722, -17.7684527224))
            Line((-6.7291966722, -17.7684527224), (-14.8193666159, -11.8906001995))
        make_face()
        with BuildLine():
            Line((6.5079649301, -19.165254969), (16.2161688626, -12.1118319415))
            Line((16.2161688626, -12.1118319415), (15.4505512968, -11.0580497659))
            ThreePointArc((15.4505512968, -11.0580497659), (15.1406825363, -11.4786642225), (14.8193666159, -11.8906001995))
            ThreePointArc((14.8193666159, -11.8906001995), (11.1679197936, -15.3713228931), (6.7291966722, -17.7684527224))
            ThreePointArc((6.7291966722, -17.7684527224), (6.2381301971, -17.9467471048), (5.7423473643, -18.1114727935))
            Line((5.7423473643, -18.1114727935), (6.5079649301, -19.165254969))
        make_face()
    with SkipClean():  # cleaning this boolean's faces spoils the solid; the shape is the same uncleaned
        extrude(amount=F2_DEPTH)


solid = f1.part
